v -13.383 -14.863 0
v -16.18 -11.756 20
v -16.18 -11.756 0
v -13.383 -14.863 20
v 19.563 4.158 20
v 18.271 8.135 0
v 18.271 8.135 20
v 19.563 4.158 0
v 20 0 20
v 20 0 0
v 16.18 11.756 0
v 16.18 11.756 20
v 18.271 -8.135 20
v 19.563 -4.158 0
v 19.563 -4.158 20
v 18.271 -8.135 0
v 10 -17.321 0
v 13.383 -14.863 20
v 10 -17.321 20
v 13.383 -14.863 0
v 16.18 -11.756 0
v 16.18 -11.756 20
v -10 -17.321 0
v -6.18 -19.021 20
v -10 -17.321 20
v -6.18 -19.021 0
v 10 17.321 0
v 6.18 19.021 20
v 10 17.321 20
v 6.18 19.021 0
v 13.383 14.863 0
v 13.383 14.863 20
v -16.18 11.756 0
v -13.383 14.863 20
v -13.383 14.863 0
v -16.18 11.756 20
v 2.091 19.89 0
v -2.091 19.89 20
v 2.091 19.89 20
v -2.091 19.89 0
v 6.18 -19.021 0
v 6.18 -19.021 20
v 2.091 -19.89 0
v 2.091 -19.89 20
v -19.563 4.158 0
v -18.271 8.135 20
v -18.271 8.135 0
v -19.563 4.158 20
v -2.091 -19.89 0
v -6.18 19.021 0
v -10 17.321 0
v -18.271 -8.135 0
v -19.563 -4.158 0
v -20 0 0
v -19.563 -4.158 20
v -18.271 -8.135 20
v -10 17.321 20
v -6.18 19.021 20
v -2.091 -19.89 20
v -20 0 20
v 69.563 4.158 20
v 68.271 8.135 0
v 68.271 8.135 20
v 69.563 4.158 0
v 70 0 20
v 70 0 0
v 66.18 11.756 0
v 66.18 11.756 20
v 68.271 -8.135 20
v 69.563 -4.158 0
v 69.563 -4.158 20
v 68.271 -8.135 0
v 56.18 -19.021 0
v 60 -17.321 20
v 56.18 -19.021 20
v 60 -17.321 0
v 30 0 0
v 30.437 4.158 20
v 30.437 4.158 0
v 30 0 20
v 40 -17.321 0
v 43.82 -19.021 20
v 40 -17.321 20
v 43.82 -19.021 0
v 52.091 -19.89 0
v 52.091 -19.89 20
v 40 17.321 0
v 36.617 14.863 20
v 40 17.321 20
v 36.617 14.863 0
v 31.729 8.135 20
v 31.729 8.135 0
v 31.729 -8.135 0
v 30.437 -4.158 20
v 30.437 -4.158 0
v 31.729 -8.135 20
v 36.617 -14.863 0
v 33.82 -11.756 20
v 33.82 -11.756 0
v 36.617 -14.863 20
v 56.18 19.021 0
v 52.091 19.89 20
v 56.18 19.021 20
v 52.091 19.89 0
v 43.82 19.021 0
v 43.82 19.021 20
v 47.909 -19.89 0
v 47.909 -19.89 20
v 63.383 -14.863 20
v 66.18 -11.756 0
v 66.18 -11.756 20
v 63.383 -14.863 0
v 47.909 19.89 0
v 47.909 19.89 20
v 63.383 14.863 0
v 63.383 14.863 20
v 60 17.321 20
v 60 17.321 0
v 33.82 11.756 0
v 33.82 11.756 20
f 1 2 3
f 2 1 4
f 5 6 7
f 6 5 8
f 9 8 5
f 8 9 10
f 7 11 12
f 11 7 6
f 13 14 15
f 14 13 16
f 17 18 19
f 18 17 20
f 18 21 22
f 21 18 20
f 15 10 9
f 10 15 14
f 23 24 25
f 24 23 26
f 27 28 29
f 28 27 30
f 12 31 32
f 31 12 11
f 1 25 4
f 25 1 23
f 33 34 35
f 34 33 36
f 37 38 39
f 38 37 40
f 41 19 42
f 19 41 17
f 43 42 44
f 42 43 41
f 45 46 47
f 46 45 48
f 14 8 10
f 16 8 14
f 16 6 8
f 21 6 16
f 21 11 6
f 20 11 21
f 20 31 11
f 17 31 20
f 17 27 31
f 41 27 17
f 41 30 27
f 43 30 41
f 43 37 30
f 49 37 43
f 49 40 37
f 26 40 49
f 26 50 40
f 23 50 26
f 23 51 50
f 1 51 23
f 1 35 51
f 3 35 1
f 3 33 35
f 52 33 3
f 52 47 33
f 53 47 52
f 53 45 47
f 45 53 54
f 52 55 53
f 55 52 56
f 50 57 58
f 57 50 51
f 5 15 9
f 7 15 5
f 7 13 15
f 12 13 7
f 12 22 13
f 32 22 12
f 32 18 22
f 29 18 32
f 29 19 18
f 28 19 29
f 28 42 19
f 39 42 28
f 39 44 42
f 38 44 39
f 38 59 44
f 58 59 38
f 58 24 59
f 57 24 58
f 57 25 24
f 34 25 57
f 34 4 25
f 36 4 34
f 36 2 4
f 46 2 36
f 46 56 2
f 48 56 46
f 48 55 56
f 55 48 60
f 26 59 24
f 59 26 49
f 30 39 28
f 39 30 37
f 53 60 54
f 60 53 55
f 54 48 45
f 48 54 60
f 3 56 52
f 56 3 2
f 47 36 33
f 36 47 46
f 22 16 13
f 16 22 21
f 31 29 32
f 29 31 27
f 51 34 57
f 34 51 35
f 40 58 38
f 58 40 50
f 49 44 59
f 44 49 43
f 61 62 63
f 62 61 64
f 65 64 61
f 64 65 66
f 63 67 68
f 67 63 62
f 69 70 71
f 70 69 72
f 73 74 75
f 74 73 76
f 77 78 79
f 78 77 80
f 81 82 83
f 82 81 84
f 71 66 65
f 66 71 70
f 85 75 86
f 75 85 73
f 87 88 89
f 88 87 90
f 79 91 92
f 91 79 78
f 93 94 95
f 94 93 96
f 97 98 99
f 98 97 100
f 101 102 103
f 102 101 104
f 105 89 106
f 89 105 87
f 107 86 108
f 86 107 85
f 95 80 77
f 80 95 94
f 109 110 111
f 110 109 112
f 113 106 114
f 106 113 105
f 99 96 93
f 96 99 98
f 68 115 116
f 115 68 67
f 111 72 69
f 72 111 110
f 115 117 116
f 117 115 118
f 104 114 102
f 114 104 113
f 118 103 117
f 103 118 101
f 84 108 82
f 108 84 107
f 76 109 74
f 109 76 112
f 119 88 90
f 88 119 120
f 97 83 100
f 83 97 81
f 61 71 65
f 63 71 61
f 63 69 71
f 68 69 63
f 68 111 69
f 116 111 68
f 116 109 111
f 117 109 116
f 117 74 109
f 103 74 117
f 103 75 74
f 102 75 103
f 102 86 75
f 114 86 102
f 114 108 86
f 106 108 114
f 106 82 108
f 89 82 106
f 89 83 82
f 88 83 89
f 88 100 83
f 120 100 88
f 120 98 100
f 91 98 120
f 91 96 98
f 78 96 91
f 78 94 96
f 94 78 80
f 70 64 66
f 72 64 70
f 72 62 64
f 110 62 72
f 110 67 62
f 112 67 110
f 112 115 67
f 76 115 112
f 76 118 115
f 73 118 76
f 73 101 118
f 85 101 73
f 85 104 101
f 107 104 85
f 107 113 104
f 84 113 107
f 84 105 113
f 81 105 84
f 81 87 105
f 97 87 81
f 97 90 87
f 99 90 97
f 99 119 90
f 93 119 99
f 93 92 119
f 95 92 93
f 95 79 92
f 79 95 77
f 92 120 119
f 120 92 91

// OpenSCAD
x = 10;

cylinder(h = 20, r = x);

x = 20;

translate ([50, 0, 0])
cylinder(h = 20, r = x);
